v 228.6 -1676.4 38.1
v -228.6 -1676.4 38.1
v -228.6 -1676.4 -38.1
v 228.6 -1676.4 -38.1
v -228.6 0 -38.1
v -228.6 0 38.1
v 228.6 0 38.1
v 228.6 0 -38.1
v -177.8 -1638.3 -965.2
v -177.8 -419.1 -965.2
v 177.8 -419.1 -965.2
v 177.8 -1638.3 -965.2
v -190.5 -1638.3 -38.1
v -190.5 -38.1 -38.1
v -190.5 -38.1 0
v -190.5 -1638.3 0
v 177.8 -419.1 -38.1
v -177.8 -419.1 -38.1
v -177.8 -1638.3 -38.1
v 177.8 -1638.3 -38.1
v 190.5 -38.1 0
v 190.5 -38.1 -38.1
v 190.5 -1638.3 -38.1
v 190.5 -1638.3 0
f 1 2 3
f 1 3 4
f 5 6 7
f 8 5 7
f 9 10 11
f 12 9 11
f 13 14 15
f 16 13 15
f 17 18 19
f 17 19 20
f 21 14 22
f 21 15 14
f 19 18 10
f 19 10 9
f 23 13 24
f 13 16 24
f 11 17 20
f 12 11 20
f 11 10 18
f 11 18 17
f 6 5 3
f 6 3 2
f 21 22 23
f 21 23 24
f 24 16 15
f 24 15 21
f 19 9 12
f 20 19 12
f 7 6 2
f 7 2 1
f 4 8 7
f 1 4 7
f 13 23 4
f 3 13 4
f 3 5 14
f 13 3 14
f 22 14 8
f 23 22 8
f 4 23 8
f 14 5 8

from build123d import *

# Parameters (mm, degrees)
F0_W     = 457.2
F0_H     = 76.2
F1_DEPTH = 1676.4
F3_T     = -38.1
F4_W     = 355.6
F4_H     = 1219.2
F5_DEPTH = 927.1


with BuildPart() as f1:
    # F0 (on Front) → F1 (new body)
    with BuildSketch(Plane.XZ):
        Rectangle(F0_W, F0_H)
    extrude(amount=F1_DEPTH)

    # F3
    f3_openings = [f1.faces().sort_by_distance(p)[0] for p in [
        (0, -838.2, -38.1),
    ]]
    offset(amount=F3_T, openings=f3_openings)


with BuildPart() as f5:
    # F4 (on face) → F5 (new body)
    with BuildSketch(Plane(origin=(0, 0, -38.1), x_dir=(1, 0, 0), z_dir=(0, 0, -1))):
        with Locations((0, 1028.7)):
            Rectangle(F4_W, F4_H)
    extrude(amount=F5_DEPTH)


solid = Compound([f1.part, f5.part])
